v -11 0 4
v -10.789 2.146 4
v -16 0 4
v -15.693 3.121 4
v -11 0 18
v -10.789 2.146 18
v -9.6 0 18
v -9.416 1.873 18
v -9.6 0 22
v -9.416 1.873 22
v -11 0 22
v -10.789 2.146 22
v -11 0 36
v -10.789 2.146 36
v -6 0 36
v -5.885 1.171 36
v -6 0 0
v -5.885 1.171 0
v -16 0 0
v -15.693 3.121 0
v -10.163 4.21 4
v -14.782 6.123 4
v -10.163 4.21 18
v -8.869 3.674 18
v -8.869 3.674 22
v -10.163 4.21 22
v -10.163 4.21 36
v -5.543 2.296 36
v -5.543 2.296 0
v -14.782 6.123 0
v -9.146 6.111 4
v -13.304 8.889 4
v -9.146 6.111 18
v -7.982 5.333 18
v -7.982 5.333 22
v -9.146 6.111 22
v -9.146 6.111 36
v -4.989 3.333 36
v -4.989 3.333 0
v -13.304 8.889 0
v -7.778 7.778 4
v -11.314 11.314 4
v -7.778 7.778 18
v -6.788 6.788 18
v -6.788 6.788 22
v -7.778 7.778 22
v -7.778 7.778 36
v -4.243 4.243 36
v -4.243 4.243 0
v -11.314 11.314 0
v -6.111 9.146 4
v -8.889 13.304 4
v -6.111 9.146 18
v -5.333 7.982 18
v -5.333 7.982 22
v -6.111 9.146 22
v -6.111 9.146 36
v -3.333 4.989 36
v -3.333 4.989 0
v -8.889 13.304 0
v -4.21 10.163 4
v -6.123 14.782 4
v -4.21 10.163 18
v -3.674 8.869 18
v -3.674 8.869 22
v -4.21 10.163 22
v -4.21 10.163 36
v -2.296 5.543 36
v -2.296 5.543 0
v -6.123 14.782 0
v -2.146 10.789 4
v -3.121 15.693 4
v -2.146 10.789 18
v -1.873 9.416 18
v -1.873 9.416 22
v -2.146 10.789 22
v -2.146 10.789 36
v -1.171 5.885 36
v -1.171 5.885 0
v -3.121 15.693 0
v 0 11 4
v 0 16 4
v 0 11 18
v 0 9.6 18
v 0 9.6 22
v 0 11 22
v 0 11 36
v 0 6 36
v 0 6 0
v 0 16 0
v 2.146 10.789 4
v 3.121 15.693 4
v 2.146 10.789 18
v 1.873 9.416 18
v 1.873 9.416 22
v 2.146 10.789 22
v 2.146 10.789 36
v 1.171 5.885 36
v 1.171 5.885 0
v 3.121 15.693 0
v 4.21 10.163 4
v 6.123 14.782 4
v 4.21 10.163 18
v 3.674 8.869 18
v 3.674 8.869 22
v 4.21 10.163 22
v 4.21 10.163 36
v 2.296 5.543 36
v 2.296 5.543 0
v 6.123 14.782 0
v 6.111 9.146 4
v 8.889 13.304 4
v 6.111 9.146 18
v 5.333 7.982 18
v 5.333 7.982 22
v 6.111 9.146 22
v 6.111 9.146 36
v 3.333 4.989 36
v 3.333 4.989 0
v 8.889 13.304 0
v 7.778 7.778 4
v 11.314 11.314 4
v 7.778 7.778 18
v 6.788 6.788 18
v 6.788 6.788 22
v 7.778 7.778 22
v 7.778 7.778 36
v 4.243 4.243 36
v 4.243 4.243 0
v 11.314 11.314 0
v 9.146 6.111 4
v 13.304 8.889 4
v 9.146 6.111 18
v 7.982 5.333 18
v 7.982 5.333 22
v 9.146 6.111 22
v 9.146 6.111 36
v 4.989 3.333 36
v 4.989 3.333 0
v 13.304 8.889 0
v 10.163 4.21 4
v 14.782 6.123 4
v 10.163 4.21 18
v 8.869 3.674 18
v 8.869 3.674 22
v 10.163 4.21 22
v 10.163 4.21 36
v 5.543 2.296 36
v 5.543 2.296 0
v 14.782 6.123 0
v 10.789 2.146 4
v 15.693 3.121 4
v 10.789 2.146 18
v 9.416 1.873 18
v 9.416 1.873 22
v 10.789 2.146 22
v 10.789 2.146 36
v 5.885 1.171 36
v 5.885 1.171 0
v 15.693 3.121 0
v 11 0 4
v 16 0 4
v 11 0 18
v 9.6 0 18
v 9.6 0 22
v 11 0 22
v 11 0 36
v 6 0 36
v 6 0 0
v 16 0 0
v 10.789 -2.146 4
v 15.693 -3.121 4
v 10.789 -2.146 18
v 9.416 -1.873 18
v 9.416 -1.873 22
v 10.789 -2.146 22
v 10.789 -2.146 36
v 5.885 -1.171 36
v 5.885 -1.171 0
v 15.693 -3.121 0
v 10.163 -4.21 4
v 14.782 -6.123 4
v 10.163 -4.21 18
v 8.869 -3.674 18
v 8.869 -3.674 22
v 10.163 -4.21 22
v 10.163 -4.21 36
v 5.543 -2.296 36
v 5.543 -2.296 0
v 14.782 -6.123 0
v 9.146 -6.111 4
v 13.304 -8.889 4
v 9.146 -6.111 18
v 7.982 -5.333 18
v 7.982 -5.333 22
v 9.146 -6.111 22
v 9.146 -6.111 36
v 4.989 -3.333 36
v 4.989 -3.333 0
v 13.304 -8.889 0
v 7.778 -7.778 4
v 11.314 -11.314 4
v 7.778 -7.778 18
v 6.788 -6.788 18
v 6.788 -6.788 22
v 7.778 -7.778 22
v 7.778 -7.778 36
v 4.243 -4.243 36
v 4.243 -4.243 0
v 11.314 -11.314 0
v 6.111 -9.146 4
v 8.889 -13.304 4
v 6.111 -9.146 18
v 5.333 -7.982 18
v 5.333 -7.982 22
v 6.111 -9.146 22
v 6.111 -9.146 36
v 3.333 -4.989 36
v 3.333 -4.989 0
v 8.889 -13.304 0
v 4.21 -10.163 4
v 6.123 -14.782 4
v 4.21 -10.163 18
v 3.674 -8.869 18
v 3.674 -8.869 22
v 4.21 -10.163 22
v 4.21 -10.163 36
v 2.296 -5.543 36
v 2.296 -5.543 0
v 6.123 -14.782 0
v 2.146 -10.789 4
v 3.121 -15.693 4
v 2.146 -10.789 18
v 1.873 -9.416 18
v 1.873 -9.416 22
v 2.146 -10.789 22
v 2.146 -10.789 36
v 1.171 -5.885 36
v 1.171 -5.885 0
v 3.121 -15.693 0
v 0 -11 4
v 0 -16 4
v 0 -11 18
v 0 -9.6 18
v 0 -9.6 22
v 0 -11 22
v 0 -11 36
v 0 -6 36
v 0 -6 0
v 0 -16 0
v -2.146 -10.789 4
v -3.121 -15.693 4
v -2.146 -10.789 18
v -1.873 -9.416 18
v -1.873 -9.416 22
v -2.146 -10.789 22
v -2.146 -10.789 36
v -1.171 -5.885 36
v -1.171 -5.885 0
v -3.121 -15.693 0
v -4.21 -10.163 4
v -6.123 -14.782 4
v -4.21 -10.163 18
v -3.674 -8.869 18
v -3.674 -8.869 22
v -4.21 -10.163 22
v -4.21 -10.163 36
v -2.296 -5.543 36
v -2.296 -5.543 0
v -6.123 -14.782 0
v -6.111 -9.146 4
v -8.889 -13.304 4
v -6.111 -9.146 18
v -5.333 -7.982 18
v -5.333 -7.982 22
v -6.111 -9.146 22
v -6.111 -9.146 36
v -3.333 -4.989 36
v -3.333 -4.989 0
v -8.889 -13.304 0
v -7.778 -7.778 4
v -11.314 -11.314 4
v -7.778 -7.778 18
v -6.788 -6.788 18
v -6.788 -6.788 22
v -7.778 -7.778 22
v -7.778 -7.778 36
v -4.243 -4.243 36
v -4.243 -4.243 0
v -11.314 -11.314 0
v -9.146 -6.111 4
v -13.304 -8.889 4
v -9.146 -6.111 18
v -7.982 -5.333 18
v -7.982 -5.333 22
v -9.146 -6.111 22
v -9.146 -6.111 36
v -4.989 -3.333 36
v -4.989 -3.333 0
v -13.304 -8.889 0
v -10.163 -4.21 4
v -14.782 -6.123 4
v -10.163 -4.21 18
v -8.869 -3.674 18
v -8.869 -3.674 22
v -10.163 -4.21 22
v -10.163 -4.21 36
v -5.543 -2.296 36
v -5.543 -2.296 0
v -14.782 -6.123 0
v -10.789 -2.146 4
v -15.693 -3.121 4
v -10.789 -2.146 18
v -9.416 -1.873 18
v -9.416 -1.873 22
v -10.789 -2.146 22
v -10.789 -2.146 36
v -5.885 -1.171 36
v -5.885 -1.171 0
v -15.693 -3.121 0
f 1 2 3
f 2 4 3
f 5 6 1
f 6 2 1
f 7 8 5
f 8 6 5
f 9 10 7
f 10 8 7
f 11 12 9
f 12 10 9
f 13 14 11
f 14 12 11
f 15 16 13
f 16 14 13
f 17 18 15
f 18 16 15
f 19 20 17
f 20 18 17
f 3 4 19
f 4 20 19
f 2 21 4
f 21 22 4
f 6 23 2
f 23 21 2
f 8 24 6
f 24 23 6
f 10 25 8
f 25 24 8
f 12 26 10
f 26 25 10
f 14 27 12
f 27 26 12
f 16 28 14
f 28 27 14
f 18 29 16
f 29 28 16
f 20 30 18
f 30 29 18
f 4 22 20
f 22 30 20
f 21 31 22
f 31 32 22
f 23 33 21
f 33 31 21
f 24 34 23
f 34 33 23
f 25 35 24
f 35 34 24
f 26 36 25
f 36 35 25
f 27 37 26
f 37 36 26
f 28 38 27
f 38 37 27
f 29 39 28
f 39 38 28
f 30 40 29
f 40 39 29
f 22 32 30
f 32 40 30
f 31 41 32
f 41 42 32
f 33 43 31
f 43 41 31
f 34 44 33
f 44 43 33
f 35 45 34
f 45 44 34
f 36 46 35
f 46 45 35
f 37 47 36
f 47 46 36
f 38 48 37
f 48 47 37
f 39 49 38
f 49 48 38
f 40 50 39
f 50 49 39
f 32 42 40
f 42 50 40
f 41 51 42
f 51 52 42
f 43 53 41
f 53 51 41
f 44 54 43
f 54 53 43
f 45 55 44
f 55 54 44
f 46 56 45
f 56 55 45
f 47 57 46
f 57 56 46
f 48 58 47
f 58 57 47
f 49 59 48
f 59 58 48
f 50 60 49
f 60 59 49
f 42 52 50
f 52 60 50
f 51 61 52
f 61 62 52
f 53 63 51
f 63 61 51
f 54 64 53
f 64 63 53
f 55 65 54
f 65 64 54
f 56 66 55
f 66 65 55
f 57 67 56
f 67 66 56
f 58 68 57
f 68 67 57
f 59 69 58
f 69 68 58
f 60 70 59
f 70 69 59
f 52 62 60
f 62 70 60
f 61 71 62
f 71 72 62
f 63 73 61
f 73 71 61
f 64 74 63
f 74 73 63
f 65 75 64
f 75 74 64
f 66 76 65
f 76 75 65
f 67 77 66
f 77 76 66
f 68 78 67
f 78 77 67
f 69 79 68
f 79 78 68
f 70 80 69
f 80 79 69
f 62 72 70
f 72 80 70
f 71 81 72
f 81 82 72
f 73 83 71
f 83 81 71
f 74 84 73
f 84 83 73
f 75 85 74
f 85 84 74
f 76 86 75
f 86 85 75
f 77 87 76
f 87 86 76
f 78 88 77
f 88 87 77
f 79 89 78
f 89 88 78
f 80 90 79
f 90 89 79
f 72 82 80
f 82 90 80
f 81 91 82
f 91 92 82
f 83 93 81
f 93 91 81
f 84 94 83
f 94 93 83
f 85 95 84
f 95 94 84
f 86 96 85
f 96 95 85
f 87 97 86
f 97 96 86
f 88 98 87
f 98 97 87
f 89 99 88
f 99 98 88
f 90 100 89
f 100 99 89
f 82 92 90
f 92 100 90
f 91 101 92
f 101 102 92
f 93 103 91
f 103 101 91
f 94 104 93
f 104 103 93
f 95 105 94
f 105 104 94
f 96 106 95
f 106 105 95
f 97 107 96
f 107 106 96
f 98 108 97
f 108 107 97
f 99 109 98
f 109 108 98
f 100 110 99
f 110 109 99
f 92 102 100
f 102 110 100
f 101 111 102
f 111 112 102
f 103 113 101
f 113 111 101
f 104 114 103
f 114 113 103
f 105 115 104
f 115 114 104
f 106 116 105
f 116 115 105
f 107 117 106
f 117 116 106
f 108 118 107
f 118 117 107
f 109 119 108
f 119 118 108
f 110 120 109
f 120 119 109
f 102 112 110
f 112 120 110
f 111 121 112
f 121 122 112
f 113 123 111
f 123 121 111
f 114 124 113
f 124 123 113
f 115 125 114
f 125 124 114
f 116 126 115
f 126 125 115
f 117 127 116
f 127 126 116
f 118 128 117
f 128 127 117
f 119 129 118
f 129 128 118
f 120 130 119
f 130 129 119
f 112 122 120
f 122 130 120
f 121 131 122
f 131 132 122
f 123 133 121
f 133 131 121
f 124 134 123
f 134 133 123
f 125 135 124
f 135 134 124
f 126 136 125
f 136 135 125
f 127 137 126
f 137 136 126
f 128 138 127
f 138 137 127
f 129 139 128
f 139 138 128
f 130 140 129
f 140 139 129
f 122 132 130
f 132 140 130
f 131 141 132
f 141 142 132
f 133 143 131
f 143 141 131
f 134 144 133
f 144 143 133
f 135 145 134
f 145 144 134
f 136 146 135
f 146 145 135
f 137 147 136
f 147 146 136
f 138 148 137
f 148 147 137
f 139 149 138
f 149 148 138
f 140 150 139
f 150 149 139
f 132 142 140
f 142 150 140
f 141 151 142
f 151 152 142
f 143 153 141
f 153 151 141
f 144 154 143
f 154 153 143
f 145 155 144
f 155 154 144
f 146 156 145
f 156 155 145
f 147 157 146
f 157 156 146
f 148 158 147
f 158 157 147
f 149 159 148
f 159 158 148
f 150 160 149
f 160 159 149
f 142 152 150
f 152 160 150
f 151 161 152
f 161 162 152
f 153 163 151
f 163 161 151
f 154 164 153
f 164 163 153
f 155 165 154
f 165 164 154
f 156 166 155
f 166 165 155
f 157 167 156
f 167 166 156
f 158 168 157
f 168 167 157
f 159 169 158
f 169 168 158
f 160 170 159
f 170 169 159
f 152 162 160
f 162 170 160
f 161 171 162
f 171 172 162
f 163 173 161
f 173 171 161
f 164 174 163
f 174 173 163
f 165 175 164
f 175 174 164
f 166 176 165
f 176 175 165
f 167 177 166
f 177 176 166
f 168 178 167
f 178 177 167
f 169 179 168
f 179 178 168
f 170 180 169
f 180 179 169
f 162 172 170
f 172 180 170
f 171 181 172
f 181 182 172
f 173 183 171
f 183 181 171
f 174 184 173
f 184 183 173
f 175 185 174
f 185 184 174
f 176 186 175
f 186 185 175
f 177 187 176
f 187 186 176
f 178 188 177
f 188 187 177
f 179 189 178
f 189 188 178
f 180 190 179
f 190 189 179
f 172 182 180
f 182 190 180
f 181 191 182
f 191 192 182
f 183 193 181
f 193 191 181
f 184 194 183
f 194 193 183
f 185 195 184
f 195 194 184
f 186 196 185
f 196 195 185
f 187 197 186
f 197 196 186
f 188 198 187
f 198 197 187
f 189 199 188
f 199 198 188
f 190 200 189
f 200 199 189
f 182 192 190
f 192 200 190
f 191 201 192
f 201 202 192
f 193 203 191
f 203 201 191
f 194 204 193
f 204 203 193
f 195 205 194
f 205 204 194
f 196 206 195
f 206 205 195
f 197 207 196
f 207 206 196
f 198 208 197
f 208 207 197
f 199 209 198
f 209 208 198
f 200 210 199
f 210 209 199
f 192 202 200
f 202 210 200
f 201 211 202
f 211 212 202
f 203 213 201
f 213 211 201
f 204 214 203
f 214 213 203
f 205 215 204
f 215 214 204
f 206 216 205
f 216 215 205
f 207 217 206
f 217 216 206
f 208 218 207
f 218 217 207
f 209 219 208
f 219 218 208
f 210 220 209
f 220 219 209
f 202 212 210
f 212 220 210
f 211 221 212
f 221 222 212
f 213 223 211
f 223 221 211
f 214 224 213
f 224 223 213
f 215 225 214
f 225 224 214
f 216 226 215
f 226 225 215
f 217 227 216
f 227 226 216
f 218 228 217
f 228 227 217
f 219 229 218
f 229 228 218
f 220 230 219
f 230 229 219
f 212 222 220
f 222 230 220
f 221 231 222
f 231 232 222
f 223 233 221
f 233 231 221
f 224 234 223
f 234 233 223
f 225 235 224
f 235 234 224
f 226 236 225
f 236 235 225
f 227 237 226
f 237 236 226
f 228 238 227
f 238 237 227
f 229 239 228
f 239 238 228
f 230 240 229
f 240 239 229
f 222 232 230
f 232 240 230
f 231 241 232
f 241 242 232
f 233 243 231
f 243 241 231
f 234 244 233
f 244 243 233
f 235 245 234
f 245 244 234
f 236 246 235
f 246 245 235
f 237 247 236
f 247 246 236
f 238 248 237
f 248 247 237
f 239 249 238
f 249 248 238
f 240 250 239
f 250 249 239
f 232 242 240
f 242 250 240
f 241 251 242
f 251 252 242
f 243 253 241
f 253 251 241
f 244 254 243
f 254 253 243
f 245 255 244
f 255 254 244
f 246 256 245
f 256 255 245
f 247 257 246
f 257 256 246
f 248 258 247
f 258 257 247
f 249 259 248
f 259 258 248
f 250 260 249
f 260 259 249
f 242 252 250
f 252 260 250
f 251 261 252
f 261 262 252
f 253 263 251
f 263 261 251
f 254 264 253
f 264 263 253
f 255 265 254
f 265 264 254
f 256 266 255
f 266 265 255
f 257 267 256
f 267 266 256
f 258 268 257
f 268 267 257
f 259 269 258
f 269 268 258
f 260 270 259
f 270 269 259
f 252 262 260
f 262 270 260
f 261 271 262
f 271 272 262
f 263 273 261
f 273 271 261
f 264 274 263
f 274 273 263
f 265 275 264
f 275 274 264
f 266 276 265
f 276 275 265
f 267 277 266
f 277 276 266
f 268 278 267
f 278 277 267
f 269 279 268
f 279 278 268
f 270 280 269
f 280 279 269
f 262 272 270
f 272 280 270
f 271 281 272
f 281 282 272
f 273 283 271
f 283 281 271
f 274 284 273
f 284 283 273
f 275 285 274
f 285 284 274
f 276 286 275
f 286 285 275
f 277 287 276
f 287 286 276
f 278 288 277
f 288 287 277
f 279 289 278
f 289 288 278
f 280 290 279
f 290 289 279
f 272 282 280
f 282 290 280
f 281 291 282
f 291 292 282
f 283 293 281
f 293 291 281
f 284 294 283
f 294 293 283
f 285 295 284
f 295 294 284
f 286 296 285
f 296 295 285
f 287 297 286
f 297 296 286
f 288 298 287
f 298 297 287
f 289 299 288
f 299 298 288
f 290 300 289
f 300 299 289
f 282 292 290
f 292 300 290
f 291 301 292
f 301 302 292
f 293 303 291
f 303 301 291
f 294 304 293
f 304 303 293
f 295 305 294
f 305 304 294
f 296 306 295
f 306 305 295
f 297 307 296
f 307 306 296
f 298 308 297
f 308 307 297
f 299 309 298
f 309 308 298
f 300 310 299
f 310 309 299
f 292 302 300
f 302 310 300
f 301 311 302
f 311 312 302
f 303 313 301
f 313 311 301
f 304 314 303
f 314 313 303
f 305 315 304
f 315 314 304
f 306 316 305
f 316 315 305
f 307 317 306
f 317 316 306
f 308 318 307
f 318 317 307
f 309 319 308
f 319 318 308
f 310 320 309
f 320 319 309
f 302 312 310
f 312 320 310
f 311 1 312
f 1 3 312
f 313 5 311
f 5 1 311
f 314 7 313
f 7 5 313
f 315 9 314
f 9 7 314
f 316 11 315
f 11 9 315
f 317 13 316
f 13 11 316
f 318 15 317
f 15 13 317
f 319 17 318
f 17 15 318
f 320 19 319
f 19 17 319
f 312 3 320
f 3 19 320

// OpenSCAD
$fn = 32;

// ----------------------------------------------------------------------
// Grooved revolve: flanged, bore R6
// ----------------------------------------------------------------------

// --- parameters (mm) ---
bore_r = 6;               // bore radius
outer_r = 11;             // outer radius of the body
total_h = 36;             // overall height, Z
wall = 5;                 // radial wall thickness
groove_w = 4;             // groove width
groove_d = 1.4;           // groove depth
grooves = 1;              // number of outer grooves
flange_r = 16;            // flange radius
flange_h = 4;             // flange height

bbox_x = 2 * flange_r;  // full diameter
bore_d = 2 * bore_r;  // bore diameter
body_d = 2 * outer_r;  // body diameter
flange_d = 2 * flange_r;  // flange diameter
revolve_angle = 360;  // full turn around the Z axis

profile = [[6, 0], [11, 0], [16, 0], [16, 4], [11, 4], [11, 18], [9.6, 18], [9.6, 22], [11, 22], [11, 36], [6, 36]];  // primary outline, 11 points, counter clockwise

// --- the one profile operation ---
rotate_extrude(angle = revolve_angle) polygon(points = profile);
